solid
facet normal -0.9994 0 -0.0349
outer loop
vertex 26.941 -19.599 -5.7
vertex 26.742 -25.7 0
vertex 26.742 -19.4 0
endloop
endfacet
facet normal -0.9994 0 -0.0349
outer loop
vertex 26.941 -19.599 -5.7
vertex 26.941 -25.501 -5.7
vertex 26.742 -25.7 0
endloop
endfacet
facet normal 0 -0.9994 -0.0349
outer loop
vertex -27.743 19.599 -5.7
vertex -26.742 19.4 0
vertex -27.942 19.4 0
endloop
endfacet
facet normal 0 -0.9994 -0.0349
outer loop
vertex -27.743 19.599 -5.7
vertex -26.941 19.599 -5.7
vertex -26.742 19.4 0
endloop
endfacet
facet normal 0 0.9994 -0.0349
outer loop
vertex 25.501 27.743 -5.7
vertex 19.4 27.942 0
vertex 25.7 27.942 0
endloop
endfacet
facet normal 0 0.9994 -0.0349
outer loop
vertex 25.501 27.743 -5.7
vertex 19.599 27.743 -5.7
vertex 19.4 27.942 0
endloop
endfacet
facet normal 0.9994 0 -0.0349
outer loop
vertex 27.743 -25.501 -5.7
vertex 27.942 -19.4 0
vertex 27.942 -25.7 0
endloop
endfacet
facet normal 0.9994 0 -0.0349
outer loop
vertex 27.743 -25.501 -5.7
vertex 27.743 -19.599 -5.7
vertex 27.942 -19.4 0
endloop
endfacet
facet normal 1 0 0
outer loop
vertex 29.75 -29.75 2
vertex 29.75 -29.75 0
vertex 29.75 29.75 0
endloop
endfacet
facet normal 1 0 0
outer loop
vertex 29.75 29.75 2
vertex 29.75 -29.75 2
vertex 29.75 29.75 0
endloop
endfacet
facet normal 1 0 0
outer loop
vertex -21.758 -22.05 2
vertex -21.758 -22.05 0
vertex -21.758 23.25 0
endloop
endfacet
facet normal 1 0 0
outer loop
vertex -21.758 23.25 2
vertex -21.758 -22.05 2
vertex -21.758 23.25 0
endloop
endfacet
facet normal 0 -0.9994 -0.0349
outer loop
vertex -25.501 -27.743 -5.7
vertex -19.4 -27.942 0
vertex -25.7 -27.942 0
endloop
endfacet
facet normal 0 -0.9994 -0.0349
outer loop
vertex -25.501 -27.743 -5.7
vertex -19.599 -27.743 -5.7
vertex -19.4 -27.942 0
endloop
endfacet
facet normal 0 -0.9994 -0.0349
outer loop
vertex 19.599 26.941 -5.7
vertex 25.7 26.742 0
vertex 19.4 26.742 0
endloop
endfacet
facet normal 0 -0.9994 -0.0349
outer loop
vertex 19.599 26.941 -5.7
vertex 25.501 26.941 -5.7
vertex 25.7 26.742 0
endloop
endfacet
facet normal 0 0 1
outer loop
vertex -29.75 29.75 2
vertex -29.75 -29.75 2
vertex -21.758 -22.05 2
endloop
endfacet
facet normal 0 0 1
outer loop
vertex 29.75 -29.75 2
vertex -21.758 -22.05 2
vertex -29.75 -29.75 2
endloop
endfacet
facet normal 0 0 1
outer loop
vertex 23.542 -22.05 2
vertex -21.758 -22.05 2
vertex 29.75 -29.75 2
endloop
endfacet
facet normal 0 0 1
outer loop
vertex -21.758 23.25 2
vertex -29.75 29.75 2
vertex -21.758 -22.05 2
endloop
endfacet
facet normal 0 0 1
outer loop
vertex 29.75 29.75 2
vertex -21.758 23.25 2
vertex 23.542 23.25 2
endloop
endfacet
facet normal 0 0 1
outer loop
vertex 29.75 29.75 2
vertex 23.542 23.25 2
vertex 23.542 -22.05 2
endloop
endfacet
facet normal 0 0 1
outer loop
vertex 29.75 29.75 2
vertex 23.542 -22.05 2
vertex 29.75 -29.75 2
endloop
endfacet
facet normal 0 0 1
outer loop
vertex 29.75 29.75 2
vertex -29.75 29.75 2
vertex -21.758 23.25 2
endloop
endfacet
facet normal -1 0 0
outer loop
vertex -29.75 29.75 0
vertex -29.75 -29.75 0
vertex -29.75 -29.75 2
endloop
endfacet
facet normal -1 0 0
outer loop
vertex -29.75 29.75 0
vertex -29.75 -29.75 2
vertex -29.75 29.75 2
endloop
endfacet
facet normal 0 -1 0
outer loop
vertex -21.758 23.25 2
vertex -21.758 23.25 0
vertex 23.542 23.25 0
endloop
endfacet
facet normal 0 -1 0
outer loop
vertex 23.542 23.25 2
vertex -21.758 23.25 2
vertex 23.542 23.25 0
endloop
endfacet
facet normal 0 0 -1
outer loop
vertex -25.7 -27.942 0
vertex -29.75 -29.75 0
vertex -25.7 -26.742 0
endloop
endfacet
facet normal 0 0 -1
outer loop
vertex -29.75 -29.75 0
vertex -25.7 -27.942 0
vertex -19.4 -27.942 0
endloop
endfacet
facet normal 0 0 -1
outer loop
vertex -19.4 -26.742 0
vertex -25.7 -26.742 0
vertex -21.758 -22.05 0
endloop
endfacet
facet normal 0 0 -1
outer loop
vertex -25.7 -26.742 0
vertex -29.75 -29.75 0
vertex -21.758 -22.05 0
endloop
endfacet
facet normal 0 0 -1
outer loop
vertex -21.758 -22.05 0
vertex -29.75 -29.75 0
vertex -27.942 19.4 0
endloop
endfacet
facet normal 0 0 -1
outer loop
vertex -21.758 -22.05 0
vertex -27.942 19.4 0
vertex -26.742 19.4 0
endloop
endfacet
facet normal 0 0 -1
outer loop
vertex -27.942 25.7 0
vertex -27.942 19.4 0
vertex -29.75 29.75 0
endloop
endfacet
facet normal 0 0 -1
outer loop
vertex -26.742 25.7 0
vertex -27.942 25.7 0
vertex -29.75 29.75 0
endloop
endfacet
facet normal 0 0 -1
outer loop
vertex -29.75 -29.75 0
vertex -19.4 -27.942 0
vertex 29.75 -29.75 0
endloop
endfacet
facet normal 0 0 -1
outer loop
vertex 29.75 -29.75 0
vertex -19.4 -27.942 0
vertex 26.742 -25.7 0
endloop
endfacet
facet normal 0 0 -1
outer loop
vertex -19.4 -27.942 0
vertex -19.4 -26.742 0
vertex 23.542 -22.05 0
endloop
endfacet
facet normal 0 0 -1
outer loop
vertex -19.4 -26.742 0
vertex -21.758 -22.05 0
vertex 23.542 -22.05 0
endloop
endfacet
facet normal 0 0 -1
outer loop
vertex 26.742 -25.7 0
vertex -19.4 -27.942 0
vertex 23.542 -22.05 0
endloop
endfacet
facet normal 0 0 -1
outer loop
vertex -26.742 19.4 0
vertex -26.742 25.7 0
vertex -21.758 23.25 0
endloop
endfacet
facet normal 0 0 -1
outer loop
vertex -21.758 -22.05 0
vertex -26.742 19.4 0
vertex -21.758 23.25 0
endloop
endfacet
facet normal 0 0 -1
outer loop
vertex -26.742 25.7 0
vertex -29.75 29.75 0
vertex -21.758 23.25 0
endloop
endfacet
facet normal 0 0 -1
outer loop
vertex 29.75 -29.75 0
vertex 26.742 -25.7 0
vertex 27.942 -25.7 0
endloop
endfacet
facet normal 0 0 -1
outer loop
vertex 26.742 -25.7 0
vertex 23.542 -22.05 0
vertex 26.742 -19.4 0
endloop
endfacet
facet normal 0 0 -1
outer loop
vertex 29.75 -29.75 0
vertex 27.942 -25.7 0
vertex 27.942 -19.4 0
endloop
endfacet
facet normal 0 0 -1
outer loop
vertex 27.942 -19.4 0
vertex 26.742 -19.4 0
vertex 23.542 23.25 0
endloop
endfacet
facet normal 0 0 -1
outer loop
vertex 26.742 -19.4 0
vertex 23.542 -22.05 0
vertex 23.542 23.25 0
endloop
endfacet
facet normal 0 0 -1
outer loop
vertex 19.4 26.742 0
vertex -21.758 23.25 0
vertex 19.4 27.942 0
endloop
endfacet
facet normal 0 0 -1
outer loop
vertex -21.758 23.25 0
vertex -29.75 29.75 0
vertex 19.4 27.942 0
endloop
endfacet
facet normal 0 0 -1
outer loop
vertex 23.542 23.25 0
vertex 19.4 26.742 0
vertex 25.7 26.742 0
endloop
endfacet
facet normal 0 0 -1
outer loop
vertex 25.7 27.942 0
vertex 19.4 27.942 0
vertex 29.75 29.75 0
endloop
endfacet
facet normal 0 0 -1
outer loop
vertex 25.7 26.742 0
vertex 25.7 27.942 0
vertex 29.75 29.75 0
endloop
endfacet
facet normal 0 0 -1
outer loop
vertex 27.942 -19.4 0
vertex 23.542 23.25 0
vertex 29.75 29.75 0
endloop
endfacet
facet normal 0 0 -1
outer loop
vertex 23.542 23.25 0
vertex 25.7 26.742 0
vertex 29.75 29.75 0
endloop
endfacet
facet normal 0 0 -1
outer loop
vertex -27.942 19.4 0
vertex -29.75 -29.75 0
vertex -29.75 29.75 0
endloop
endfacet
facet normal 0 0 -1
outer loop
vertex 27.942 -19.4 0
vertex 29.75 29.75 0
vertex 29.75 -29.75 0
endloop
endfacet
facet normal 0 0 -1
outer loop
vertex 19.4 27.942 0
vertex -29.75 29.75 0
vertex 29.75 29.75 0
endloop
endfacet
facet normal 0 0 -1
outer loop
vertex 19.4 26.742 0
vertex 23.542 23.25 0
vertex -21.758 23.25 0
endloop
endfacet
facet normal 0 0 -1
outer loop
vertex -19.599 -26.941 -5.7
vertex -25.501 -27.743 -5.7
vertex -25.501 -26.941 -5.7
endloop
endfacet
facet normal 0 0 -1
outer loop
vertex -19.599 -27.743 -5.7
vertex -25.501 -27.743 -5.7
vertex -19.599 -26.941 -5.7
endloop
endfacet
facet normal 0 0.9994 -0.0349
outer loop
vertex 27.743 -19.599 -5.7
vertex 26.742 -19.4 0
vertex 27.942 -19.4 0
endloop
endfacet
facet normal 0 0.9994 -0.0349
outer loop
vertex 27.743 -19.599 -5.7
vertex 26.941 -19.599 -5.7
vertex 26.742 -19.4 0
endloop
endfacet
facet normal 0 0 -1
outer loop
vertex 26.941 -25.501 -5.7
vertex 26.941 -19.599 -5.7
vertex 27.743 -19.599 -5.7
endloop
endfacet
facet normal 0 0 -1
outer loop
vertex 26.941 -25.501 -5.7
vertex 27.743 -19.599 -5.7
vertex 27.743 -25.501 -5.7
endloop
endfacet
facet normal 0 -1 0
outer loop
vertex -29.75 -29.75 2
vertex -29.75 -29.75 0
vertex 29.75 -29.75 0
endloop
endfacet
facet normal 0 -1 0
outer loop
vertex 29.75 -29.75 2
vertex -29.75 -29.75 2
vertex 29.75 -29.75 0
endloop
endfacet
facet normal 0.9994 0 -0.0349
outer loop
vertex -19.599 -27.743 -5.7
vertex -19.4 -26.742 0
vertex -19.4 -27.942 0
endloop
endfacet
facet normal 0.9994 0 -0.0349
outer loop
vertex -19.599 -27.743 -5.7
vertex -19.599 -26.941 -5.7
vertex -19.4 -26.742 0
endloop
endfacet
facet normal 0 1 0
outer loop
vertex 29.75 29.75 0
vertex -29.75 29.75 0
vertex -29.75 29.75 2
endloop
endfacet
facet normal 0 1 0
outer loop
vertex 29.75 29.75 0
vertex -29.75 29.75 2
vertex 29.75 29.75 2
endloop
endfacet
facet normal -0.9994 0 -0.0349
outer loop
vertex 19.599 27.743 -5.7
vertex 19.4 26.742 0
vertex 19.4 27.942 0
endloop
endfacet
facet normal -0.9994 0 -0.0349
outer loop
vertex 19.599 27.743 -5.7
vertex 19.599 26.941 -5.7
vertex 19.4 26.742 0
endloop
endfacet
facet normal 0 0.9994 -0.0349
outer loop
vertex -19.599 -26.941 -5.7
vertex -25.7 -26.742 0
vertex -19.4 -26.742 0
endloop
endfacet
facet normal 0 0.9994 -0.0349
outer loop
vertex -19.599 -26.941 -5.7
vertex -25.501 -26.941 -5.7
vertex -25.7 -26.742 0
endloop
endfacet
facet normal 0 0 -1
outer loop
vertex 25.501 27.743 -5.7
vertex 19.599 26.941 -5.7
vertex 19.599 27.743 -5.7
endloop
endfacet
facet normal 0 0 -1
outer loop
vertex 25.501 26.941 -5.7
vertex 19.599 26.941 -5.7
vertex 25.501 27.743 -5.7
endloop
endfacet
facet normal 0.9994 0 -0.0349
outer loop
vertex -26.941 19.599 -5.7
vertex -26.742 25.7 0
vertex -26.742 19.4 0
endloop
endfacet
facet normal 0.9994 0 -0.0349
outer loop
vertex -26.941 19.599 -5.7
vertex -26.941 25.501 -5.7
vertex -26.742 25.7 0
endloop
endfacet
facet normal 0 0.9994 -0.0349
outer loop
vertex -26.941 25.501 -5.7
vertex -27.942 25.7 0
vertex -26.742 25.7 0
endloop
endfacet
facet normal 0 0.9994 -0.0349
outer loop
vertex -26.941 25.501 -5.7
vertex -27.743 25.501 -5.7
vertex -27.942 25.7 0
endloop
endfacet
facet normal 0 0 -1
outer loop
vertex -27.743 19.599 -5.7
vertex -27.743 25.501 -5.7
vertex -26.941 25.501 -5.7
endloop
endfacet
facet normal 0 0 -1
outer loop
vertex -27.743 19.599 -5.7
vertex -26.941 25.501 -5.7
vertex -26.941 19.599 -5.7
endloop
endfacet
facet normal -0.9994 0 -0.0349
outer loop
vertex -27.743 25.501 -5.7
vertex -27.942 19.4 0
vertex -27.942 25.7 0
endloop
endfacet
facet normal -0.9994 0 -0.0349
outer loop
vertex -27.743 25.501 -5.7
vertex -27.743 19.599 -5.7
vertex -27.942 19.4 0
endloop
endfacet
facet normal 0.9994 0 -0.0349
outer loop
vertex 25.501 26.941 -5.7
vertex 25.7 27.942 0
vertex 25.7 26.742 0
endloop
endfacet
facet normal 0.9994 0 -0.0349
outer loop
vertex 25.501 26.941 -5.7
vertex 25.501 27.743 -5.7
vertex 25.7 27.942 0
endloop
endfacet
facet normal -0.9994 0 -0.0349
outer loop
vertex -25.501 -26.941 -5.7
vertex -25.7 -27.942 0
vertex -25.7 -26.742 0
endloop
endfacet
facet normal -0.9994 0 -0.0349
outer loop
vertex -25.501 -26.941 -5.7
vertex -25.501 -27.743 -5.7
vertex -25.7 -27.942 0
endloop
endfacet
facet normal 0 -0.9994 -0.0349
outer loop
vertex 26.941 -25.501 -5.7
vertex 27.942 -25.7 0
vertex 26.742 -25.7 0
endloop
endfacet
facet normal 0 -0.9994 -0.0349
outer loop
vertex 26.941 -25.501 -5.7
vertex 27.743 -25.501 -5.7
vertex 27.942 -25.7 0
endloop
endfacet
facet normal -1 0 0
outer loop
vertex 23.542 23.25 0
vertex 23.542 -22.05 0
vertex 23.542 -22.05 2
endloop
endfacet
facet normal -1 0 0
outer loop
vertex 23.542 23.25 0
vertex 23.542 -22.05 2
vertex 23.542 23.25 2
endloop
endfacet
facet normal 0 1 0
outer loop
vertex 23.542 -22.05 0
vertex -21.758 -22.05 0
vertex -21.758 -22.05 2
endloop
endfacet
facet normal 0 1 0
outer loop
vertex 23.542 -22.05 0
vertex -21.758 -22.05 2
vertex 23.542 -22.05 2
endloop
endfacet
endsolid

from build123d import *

# Parameters (mm, degrees)
F0_W     = 59.5
F0_H     = 59.5
F0_W_2   = 45.3
F0_H_2   = 45.3
F1_DEPTH = 2
F2_W     = 1.2
F2_H     = 6.3
F2_W_2   = 6.3
F2_H_2   = 1.2
F3_DEPTH = 5.7
F3_TAPER = 2


# Not quite as in the source:
# - a feature names something its author has since deleted; it is built from what else it names


with BuildPart() as f1:
    # F0 (on Top) → F1 (new body)
    with BuildSketch(Plane.XY):
        Rectangle(F0_W, F0_H)
        with Locations((0.8918590039, 0.6)):
            Rectangle(F0_W_2, F0_H_2, mode=Mode.SUBTRACT)
    extrude(amount=F1_DEPTH)

    # F2 (on face) → F3 (join)
    with BuildSketch(Plane(origin=(0, 0, 0), x_dir=(1, 0, 0), z_dir=(0, 0, -1))):
        with Locations((27.3418590039, 22.55)):
            Rectangle(F2_W, F2_H)
        with Locations((22.55, -27.3418590039)):
            Rectangle(F2_W_2, F2_H_2)
        with Locations((-27.3418590039, -22.55)):
            Rectangle(F2_W, F2_H)
        with Locations((-22.55, 27.3418590039)):
            Rectangle(F2_W_2, F2_H_2)
    extrude(amount=F3_DEPTH, taper=F3_TAPER)


solid = f1.part
